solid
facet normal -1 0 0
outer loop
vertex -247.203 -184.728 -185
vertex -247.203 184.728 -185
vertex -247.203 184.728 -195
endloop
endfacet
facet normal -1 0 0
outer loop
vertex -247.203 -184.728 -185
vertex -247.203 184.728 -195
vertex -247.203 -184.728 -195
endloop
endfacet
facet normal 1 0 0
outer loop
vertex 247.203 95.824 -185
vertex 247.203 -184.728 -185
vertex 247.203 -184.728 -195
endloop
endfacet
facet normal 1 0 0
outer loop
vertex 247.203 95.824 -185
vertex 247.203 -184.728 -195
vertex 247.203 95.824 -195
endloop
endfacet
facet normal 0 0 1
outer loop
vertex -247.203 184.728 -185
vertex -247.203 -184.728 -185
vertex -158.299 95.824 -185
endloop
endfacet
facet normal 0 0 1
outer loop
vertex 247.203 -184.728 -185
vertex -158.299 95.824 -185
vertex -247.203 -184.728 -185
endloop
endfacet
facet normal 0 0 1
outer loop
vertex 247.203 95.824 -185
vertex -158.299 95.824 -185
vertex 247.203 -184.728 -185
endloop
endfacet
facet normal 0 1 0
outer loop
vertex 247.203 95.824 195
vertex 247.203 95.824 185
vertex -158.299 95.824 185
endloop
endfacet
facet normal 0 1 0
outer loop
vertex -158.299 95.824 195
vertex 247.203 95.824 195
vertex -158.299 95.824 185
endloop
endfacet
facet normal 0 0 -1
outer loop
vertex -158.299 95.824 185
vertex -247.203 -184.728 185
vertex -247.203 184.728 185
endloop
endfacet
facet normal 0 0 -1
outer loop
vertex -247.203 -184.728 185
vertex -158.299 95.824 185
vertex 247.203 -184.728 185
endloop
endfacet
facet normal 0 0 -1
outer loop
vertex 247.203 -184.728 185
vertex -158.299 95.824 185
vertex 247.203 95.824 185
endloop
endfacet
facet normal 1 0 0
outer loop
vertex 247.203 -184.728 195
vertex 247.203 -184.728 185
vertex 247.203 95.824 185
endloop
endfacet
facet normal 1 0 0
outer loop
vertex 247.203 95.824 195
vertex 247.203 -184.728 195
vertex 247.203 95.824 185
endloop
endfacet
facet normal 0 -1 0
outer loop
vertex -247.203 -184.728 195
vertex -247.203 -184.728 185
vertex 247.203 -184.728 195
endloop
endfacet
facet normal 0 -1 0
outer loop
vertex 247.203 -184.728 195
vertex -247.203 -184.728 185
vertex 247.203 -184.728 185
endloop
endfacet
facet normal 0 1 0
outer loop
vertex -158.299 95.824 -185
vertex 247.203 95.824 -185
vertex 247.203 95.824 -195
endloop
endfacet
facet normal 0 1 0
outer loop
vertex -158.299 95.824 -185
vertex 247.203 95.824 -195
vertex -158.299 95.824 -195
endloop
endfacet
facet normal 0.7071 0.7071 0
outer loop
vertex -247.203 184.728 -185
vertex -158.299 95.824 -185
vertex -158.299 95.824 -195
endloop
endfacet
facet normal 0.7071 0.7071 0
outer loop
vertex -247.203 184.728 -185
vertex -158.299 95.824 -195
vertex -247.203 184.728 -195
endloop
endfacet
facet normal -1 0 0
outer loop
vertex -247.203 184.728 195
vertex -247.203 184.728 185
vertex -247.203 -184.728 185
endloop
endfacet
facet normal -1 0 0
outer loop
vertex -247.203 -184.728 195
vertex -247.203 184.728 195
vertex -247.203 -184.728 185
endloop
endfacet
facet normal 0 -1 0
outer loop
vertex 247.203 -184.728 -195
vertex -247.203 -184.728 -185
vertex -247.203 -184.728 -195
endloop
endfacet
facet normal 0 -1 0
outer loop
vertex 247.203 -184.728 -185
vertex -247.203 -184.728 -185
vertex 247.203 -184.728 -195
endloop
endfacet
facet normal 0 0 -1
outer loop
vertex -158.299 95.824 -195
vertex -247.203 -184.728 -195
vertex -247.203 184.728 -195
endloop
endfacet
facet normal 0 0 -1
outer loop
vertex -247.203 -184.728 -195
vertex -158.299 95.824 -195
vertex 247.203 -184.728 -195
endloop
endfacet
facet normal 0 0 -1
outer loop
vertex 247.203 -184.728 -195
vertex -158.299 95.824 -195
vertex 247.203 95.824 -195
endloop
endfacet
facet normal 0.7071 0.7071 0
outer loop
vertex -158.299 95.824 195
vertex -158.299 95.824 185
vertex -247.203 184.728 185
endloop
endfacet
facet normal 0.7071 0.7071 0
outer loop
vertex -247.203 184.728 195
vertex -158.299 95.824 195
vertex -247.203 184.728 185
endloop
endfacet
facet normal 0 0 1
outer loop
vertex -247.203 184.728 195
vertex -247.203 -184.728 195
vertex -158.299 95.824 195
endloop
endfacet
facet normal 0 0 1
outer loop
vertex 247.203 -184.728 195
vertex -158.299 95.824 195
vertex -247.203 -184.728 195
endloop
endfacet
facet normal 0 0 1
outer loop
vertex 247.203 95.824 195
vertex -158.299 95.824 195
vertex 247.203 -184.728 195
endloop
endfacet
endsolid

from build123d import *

# Parameters (mm, degrees)
BOSS_EXTRUDE1_START = 185
BOSS_EXTRUDE1_DEPTH = 10
BOSS_EXTRUDE2_START = -185
BOSS_EXTRUDE2_DEPTH = 10


with BuildPart() as part:
    # Sketch1 → Boss-Extrude1 (new body)
    with BuildSketch(Plane.XY.offset(BOSS_EXTRUDE1_START)):
        Polygon((-247.202646763, 184.728372851), (-247.202646763, -184.728372851), (247.202646763, -184.728372851), (247.202646763, 95.824349837), (-158.298623749, 95.824349837), align=None)
    extrude(amount=BOSS_EXTRUDE1_DEPTH)


with BuildPart() as body_2:
    # Sketch1<3> → Boss-Extrude2 (new body)
    with BuildSketch(Plane.XY.offset(BOSS_EXTRUDE2_START)):
        Polygon((-247.202646763, 184.728372851), (-247.202646763, -184.728372851), (247.202646763, -184.728372851), (247.202646763, 95.824349837), (-158.298623749, 95.824349837), align=None)
    extrude(amount=-BOSS_EXTRUDE2_DEPTH)


solid = Compound([part.part, body_2.part])
